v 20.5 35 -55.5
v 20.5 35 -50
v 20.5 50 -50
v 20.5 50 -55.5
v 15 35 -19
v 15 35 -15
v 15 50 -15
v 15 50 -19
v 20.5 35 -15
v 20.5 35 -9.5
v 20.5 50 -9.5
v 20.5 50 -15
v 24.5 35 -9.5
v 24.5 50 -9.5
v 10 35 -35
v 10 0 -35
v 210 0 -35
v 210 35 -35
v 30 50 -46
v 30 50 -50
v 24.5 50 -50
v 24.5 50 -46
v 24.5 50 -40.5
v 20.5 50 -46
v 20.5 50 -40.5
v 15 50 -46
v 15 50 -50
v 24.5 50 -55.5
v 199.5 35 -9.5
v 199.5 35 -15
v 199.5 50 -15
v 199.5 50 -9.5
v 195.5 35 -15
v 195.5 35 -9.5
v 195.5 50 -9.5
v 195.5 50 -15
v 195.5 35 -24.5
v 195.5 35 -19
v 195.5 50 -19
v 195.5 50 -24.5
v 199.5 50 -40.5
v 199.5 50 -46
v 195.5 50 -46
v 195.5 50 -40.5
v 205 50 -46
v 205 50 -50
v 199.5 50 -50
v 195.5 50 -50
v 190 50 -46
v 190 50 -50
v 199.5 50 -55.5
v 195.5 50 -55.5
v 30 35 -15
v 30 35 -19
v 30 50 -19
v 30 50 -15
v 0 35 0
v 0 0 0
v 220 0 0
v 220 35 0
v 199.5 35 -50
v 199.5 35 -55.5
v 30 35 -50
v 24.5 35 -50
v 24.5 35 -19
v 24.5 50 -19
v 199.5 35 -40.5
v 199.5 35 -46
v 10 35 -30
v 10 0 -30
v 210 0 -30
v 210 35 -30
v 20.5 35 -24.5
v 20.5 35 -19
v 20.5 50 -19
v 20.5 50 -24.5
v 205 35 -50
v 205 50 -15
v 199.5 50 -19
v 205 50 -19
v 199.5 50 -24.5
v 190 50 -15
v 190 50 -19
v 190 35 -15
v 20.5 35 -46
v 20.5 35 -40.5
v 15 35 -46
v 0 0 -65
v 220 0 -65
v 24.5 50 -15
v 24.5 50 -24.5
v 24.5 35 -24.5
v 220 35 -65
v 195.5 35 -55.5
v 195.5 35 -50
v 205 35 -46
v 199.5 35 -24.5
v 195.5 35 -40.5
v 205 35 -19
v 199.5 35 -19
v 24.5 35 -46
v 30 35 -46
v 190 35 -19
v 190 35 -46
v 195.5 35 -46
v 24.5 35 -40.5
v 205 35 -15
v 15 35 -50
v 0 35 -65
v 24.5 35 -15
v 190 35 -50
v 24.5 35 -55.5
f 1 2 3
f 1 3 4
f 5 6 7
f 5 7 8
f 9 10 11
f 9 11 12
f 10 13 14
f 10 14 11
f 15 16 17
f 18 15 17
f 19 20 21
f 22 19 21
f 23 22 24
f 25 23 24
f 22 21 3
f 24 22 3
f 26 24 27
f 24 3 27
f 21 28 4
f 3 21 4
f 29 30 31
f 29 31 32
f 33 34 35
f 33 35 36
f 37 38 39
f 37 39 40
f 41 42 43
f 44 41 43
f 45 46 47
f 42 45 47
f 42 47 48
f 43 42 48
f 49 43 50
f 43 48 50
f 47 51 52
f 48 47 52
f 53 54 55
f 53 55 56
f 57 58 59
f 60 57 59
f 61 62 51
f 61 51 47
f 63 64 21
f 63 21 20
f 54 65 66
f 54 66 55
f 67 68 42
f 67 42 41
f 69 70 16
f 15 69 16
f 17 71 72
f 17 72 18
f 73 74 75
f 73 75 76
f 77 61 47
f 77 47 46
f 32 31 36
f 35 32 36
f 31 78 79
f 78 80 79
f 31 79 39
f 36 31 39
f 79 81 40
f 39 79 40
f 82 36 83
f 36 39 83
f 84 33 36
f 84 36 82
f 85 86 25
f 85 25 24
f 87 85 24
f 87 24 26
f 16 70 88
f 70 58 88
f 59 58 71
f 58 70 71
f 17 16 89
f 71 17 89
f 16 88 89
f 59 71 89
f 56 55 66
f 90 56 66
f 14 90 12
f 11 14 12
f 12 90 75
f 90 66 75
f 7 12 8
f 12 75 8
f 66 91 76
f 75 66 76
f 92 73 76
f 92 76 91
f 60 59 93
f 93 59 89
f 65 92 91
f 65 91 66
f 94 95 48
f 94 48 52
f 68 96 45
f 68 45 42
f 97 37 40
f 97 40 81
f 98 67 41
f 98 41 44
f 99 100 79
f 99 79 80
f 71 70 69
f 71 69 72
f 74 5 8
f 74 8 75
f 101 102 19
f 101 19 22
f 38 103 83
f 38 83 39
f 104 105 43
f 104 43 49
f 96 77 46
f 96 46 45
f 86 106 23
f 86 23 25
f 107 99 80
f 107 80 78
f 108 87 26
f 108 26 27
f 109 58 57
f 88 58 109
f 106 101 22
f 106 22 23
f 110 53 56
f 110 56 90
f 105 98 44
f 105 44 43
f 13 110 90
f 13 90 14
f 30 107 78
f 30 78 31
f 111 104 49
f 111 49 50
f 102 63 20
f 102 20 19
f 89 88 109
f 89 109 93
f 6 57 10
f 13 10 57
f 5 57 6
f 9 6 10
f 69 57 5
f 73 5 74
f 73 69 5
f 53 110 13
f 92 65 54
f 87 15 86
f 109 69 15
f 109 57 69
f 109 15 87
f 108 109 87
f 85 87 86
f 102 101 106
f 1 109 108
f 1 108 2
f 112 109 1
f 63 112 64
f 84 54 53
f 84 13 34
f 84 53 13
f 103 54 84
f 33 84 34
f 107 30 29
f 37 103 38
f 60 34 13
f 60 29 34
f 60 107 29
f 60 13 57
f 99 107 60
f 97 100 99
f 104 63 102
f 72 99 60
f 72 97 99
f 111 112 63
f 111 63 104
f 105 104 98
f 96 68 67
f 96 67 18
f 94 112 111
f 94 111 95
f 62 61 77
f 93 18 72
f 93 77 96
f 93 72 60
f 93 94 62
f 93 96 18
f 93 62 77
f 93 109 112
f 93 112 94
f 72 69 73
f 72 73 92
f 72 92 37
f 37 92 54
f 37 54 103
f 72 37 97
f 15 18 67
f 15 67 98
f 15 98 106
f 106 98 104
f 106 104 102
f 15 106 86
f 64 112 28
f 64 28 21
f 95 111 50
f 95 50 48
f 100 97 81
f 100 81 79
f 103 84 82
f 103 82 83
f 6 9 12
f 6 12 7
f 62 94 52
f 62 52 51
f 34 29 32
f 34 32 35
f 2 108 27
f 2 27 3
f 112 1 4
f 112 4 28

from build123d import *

# Parameters (mm, degrees)
SKICA1_W                = 220
SKICA1_H                = 65
SKICA1_W_2              = 200
SKICA1_H_2              = 5
P_IDAT_VYSUNUT_M1_DEPTH = 35
P_IDAT_VYSUNUT_M2_DEPTH = 15


with BuildPart() as part:
    # Skica1 → Přidat vysunutím1 (new body)
    with BuildSketch(Plane(origin=(0, 0, 0), x_dir=(1, 0, 0), z_dir=(0, 1, 0))):
        with Locations((110, 32.5)):
            Rectangle(SKICA1_W, SKICA1_H)
        with Locations((110, 32.5)):
            Rectangle(SKICA1_W_2, SKICA1_H_2, mode=Mode.SUBTRACT)
    extrude(amount=P_IDAT_VYSUNUT_M1_DEPTH)

    # Skica2 → Přidat vysunutím2 (add)
    with BuildSketch(Plane(origin=(0, 35, 0), x_dir=(1, 0, 0), z_dir=(0, 1, 0))):
        Polygon((15, 15), (15, 19), (20.5, 19), (20.5, 24.5), (24.5, 24.5), (24.5, 19), (30, 19), (30, 15), (24.5, 15), (24.5, 9.5), (20.5, 9.5), (20.5, 15), align=None)
        Polygon((24.5, 50), (30, 50), (30, 46), (24.5, 46), (24.5, 40.5), (20.5, 40.5), (20.5, 46), (15, 46), (15, 50), (20.5, 50), (20.5, 55.5), (24.5, 55.5), align=None)
        Polygon((205, 50), (205, 46), (199.5, 46), (199.5, 40.5), (195.5, 40.5), (195.5, 46), (190, 46), (190, 50), (195.5, 50), (195.5, 55.5), (199.5, 55.5), (199.5, 50), align=None)
        Polygon((205, 15), (199.5, 15), (199.5, 9.5), (195.5, 9.5), (195.5, 15), (190, 15), (190, 19), (195.5, 19), (195.5, 24.5), (199.5, 24.5), (199.5, 19), (205, 19), align=None)
    extrude(amount=P_IDAT_VYSUNUT_M2_DEPTH)


solid = part.part
